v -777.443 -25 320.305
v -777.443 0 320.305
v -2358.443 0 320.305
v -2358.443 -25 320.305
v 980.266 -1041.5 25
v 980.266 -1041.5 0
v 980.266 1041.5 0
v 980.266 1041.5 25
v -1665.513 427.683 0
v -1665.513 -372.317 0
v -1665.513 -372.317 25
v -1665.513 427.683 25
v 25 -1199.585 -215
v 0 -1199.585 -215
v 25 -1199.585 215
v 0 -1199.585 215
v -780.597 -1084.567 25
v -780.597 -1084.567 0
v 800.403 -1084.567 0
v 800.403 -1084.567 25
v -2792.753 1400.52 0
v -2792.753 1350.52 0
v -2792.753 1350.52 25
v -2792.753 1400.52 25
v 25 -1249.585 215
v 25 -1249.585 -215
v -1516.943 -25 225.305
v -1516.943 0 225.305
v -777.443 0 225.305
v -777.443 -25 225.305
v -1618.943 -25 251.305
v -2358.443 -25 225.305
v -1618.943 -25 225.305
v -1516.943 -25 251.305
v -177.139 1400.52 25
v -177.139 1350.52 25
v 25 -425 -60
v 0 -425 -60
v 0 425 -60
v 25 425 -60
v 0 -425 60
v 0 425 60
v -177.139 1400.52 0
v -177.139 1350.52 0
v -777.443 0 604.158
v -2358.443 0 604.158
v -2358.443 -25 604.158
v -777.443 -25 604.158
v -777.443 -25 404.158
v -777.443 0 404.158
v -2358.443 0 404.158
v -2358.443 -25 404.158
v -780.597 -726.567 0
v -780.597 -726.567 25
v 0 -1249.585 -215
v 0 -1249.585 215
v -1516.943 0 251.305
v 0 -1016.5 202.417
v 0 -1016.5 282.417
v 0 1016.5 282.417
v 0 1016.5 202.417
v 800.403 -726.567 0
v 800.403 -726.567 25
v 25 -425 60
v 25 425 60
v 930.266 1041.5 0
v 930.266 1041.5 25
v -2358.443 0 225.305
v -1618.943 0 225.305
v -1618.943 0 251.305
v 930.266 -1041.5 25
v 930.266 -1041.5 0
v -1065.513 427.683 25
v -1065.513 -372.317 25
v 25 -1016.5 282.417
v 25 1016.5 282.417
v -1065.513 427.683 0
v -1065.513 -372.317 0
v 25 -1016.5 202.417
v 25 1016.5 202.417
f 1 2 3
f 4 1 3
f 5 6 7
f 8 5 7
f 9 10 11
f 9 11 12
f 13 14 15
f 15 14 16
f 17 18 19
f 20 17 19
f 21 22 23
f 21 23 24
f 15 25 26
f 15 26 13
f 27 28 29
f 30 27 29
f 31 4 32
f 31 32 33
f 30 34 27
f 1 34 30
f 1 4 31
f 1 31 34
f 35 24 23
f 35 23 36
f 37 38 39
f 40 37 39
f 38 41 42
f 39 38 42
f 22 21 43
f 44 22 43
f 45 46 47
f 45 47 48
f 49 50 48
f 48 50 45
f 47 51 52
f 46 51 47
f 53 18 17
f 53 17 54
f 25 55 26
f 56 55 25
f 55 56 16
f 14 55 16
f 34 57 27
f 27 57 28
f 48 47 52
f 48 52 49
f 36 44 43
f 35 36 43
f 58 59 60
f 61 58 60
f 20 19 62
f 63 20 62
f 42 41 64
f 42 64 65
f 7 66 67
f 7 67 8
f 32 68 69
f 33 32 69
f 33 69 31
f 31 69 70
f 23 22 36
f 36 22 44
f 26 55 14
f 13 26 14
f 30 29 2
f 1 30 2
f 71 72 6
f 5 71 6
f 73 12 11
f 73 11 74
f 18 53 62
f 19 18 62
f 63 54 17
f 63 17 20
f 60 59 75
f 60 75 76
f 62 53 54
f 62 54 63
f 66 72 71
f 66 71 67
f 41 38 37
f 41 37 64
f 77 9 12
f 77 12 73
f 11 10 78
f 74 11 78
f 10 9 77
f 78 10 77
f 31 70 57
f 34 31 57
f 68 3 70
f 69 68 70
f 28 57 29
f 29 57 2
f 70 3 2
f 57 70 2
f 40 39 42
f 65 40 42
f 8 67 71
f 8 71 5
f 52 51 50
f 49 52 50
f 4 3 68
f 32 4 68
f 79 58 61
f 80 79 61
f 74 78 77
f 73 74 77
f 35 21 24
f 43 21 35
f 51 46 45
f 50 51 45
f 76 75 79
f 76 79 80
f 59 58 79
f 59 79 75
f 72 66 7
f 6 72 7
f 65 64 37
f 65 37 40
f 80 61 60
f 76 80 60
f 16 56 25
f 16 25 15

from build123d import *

# Parameters (mm, degrees)
F0_W     = 50
F0_H     = 430
F0_W_2   = 2033
F0_H_2   = 80
F0_W_3   = 850
F0_H_3   = 120
F1_DEPTH = 25
F2_W     = 1581
F2_H     = 358
F2_W_2   = 600
F2_H_2   = 800
F3_DEPTH = 25
F4_W     = 1581
F4_H     = 200
F5_DEPTH = 25
F6_W     = 50
F6_H     = 2083
F6_W_2   = 2615.614325
F6_H_2   = 50
F7_DEPTH = 25


with BuildPart() as f1:
    # F0 (on Right) → F1 (new body)
    with BuildSketch(Plane.YZ):
        with Locations((-1224.584521, 0)):
            Rectangle(F0_W, F0_H)
        with Locations((0, 242.416835)):
            Rectangle(F0_W_2, F0_H_2)
        Rectangle(F0_W_3, F0_H_3)
    extrude(amount=F1_DEPTH)


with BuildPart() as f3:
    # F2 (on Top) → F3 (new body)
    with BuildSketch(Plane.XY):
        with Locations((9.903193, -905.566842)):
            Rectangle(F2_W, F2_H)
        with Locations((-1365.513167, 27.682989)):
            Rectangle(F2_W_2, F2_H_2)
    extrude(amount=F3_DEPTH)


with BuildPart() as f5:
    # F4 (on Front) → F5 (new body)
    with BuildSketch(Plane.XZ):
        with Locations((-1567.942509, 504.158258)):
            Rectangle(F4_W, F4_H)
        Polygon((-1516.942509, 225.304886), (-777.442509, 225.304886), (-777.442509, 320.304886), (-2358.442509, 320.304886), (-2358.442509, 225.304886), (-1618.942509, 225.304886), (-1618.942509, 251.304886), (-1567.942509, 251.304886), (-1516.942509, 251.304886), align=None)
    extrude(amount=F5_DEPTH)


with BuildPart() as f7:
    # F6 (on Top) → F7 (new body)
    with BuildSketch(Plane.XY):
        with Locations((955.265677, 0)):
            Rectangle(F6_W, F6_H)
        with Locations((-1484.945894, 1375.520134)):
            Rectangle(F6_W_2, F6_H_2)
    extrude(amount=F7_DEPTH)


solid = Compound([f1.part, f3.part, f5.part, f7.part])
